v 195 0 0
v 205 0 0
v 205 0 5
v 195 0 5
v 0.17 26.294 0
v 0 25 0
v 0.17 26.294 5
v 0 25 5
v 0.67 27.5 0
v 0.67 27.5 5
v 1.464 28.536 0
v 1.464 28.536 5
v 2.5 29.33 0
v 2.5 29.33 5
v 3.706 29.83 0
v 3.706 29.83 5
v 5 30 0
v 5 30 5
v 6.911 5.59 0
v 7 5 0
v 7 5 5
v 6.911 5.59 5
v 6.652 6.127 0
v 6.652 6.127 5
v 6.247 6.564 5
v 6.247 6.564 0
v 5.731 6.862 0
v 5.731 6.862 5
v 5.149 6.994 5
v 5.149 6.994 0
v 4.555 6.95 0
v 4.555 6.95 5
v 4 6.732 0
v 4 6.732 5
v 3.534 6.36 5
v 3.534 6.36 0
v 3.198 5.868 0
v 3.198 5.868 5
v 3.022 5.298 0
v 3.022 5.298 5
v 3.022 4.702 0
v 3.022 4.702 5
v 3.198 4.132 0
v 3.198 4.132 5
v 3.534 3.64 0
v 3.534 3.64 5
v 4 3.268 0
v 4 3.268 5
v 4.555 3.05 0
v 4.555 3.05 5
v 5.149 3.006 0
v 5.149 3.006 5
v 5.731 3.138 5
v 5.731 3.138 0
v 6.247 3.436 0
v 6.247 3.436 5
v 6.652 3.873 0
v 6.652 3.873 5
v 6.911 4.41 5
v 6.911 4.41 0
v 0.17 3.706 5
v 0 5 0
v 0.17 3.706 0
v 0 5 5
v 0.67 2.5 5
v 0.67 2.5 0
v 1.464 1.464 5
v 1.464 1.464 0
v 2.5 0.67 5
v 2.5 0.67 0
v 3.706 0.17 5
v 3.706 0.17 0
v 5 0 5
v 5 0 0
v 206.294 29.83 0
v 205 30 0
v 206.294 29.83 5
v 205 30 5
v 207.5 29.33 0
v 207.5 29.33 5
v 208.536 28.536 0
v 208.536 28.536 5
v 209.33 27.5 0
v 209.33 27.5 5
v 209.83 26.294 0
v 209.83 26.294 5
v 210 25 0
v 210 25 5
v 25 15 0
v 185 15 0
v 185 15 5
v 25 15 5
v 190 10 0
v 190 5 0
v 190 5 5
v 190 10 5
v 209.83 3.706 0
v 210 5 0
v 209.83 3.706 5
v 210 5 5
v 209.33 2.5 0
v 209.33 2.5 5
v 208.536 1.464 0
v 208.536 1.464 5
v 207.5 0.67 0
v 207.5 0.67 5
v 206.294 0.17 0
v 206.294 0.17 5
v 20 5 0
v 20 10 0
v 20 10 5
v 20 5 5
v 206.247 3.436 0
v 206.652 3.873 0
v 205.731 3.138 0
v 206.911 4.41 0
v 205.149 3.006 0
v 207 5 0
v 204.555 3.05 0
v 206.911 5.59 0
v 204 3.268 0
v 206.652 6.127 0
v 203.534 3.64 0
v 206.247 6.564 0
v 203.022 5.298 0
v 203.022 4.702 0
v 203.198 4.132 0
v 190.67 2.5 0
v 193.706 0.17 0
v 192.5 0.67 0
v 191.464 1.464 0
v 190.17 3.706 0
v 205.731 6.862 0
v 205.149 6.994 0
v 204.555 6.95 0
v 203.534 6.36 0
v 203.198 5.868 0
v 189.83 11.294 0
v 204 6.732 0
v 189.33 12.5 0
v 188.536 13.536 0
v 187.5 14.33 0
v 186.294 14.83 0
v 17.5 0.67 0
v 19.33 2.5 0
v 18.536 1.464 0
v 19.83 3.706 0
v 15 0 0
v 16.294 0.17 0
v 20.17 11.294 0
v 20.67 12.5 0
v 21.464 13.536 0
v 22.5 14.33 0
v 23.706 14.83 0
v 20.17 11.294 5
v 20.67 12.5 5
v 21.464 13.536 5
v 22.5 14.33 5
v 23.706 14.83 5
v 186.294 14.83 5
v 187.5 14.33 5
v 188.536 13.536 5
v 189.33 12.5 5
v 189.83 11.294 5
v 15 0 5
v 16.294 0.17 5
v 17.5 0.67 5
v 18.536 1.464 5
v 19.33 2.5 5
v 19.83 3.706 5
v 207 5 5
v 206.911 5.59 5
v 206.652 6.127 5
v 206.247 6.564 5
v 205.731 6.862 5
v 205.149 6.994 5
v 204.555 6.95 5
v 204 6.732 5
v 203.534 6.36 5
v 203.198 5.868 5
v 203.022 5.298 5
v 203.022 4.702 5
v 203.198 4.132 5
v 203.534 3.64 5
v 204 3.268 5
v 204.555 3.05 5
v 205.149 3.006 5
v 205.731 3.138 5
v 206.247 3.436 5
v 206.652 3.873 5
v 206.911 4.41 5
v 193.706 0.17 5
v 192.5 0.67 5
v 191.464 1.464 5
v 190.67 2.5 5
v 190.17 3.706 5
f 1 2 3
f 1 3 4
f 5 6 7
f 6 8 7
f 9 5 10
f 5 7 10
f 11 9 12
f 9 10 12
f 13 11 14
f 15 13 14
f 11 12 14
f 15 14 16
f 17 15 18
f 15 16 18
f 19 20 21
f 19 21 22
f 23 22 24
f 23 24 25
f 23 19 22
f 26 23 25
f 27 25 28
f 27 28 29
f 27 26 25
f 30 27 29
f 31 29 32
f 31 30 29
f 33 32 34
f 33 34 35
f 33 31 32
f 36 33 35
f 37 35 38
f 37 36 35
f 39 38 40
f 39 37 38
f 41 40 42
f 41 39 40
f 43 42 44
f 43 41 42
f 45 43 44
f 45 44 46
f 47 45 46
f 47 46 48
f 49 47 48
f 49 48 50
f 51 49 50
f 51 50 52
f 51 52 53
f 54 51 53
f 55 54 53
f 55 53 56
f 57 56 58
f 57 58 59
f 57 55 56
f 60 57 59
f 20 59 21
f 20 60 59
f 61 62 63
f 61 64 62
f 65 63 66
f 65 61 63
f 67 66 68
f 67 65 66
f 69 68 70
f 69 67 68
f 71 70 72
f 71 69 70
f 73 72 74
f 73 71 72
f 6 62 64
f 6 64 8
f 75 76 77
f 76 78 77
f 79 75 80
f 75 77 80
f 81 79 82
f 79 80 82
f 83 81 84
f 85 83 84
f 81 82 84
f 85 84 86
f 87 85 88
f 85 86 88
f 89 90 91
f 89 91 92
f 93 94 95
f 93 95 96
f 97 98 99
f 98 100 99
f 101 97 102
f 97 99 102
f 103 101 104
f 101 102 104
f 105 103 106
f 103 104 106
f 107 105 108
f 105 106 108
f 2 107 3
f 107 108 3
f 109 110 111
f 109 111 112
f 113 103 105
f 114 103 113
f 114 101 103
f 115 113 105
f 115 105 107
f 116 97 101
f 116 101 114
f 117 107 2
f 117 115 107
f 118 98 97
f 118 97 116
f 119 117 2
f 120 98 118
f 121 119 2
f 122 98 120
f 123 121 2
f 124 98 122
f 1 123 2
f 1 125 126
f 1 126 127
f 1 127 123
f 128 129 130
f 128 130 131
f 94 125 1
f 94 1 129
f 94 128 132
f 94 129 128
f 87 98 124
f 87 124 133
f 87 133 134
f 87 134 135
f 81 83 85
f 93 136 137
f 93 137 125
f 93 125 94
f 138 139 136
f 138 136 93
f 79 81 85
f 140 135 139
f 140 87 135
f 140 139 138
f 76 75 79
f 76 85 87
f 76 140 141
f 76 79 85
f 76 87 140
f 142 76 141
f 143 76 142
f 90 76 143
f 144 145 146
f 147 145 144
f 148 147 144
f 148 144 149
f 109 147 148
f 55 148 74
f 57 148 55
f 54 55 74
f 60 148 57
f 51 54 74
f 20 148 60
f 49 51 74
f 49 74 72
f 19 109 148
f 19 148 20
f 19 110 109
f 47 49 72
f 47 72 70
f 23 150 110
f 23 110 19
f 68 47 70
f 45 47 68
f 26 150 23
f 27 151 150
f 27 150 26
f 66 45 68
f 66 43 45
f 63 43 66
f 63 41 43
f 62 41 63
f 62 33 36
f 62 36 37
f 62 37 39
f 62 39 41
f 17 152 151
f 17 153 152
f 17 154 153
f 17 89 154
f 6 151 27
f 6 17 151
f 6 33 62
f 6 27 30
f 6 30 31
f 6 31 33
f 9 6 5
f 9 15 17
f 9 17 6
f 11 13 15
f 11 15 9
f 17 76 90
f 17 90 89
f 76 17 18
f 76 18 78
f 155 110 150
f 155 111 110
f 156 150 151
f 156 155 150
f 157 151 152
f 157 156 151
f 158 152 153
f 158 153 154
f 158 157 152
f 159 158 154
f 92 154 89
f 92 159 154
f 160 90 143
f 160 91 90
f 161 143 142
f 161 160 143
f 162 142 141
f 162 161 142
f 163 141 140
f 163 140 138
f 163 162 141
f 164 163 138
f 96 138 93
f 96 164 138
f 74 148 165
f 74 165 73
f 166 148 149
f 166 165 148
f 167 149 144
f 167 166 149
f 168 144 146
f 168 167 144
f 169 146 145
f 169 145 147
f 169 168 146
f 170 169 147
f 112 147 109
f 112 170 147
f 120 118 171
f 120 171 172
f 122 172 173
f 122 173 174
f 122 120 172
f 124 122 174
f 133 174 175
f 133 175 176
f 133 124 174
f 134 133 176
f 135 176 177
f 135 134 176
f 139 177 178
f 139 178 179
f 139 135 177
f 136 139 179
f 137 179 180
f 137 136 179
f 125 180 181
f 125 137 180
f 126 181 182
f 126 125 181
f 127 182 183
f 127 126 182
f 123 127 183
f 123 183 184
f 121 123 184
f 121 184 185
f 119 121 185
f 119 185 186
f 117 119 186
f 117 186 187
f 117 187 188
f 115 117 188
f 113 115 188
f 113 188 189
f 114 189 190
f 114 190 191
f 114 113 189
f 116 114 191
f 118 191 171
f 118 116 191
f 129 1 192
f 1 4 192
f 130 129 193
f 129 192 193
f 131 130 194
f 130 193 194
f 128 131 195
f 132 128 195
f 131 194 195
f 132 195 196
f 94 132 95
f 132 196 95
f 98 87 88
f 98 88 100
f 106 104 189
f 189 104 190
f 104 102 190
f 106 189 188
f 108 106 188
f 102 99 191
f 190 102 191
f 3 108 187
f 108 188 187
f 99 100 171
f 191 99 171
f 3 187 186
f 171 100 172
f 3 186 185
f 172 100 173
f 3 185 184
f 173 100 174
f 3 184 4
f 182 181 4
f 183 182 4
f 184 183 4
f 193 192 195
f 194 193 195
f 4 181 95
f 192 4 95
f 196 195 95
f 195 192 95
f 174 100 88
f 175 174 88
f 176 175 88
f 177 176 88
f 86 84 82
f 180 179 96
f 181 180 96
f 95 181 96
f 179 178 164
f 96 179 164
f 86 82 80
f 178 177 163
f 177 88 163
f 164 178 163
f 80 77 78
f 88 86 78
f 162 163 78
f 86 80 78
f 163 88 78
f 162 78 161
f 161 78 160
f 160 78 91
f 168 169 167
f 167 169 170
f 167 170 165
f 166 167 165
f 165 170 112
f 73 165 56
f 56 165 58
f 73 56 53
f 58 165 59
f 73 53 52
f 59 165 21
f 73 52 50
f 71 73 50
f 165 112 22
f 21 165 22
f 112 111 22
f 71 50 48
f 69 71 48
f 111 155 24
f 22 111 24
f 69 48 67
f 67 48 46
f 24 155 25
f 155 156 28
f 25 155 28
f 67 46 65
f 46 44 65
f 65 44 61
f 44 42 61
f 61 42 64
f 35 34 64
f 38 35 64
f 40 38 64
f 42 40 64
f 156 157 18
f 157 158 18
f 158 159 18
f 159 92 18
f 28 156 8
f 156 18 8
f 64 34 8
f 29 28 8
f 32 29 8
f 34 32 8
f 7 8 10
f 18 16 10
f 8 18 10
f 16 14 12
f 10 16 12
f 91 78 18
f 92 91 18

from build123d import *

# Parameters (mm, degrees)
ESQUISSE1_R        = 2
BOSS_EXTRU_1_DEPTH = 5
CONG_1_R           = 5


with BuildPart() as part:
    # Esquisse1 → Boss.-Extru.1 (new body)
    with BuildSketch(Plane.XY):
        Polygon((0, 0), (0, 30), (210, 30), (210, 0), (190, 0), (190, 15), (20, 15), (20, 0), align=None)
        with Locations((5, 5)):
            Circle(ESQUISSE1_R, mode=Mode.SUBTRACT)
        with Locations((205, 5)):
            Circle(ESQUISSE1_R, mode=Mode.SUBTRACT)
    extrude(amount=BOSS_EXTRU_1_DEPTH)

    # Congé1
    cong_1_edges = [part.edges().sort_by_distance(p)[0] for p in [
        (0, 0, 2.5),
        (0, 30, 2.5),
        (210, 30, 2.5),
        (210, 0, 2.5),
        (190, 0, 2.5),
        (190, 15, 2.5),
        (20, 15, 2.5),
        (20, 0, 2.5),
    ]]
    fillet(cong_1_edges, radius=CONG_1_R)


solid = part.part
